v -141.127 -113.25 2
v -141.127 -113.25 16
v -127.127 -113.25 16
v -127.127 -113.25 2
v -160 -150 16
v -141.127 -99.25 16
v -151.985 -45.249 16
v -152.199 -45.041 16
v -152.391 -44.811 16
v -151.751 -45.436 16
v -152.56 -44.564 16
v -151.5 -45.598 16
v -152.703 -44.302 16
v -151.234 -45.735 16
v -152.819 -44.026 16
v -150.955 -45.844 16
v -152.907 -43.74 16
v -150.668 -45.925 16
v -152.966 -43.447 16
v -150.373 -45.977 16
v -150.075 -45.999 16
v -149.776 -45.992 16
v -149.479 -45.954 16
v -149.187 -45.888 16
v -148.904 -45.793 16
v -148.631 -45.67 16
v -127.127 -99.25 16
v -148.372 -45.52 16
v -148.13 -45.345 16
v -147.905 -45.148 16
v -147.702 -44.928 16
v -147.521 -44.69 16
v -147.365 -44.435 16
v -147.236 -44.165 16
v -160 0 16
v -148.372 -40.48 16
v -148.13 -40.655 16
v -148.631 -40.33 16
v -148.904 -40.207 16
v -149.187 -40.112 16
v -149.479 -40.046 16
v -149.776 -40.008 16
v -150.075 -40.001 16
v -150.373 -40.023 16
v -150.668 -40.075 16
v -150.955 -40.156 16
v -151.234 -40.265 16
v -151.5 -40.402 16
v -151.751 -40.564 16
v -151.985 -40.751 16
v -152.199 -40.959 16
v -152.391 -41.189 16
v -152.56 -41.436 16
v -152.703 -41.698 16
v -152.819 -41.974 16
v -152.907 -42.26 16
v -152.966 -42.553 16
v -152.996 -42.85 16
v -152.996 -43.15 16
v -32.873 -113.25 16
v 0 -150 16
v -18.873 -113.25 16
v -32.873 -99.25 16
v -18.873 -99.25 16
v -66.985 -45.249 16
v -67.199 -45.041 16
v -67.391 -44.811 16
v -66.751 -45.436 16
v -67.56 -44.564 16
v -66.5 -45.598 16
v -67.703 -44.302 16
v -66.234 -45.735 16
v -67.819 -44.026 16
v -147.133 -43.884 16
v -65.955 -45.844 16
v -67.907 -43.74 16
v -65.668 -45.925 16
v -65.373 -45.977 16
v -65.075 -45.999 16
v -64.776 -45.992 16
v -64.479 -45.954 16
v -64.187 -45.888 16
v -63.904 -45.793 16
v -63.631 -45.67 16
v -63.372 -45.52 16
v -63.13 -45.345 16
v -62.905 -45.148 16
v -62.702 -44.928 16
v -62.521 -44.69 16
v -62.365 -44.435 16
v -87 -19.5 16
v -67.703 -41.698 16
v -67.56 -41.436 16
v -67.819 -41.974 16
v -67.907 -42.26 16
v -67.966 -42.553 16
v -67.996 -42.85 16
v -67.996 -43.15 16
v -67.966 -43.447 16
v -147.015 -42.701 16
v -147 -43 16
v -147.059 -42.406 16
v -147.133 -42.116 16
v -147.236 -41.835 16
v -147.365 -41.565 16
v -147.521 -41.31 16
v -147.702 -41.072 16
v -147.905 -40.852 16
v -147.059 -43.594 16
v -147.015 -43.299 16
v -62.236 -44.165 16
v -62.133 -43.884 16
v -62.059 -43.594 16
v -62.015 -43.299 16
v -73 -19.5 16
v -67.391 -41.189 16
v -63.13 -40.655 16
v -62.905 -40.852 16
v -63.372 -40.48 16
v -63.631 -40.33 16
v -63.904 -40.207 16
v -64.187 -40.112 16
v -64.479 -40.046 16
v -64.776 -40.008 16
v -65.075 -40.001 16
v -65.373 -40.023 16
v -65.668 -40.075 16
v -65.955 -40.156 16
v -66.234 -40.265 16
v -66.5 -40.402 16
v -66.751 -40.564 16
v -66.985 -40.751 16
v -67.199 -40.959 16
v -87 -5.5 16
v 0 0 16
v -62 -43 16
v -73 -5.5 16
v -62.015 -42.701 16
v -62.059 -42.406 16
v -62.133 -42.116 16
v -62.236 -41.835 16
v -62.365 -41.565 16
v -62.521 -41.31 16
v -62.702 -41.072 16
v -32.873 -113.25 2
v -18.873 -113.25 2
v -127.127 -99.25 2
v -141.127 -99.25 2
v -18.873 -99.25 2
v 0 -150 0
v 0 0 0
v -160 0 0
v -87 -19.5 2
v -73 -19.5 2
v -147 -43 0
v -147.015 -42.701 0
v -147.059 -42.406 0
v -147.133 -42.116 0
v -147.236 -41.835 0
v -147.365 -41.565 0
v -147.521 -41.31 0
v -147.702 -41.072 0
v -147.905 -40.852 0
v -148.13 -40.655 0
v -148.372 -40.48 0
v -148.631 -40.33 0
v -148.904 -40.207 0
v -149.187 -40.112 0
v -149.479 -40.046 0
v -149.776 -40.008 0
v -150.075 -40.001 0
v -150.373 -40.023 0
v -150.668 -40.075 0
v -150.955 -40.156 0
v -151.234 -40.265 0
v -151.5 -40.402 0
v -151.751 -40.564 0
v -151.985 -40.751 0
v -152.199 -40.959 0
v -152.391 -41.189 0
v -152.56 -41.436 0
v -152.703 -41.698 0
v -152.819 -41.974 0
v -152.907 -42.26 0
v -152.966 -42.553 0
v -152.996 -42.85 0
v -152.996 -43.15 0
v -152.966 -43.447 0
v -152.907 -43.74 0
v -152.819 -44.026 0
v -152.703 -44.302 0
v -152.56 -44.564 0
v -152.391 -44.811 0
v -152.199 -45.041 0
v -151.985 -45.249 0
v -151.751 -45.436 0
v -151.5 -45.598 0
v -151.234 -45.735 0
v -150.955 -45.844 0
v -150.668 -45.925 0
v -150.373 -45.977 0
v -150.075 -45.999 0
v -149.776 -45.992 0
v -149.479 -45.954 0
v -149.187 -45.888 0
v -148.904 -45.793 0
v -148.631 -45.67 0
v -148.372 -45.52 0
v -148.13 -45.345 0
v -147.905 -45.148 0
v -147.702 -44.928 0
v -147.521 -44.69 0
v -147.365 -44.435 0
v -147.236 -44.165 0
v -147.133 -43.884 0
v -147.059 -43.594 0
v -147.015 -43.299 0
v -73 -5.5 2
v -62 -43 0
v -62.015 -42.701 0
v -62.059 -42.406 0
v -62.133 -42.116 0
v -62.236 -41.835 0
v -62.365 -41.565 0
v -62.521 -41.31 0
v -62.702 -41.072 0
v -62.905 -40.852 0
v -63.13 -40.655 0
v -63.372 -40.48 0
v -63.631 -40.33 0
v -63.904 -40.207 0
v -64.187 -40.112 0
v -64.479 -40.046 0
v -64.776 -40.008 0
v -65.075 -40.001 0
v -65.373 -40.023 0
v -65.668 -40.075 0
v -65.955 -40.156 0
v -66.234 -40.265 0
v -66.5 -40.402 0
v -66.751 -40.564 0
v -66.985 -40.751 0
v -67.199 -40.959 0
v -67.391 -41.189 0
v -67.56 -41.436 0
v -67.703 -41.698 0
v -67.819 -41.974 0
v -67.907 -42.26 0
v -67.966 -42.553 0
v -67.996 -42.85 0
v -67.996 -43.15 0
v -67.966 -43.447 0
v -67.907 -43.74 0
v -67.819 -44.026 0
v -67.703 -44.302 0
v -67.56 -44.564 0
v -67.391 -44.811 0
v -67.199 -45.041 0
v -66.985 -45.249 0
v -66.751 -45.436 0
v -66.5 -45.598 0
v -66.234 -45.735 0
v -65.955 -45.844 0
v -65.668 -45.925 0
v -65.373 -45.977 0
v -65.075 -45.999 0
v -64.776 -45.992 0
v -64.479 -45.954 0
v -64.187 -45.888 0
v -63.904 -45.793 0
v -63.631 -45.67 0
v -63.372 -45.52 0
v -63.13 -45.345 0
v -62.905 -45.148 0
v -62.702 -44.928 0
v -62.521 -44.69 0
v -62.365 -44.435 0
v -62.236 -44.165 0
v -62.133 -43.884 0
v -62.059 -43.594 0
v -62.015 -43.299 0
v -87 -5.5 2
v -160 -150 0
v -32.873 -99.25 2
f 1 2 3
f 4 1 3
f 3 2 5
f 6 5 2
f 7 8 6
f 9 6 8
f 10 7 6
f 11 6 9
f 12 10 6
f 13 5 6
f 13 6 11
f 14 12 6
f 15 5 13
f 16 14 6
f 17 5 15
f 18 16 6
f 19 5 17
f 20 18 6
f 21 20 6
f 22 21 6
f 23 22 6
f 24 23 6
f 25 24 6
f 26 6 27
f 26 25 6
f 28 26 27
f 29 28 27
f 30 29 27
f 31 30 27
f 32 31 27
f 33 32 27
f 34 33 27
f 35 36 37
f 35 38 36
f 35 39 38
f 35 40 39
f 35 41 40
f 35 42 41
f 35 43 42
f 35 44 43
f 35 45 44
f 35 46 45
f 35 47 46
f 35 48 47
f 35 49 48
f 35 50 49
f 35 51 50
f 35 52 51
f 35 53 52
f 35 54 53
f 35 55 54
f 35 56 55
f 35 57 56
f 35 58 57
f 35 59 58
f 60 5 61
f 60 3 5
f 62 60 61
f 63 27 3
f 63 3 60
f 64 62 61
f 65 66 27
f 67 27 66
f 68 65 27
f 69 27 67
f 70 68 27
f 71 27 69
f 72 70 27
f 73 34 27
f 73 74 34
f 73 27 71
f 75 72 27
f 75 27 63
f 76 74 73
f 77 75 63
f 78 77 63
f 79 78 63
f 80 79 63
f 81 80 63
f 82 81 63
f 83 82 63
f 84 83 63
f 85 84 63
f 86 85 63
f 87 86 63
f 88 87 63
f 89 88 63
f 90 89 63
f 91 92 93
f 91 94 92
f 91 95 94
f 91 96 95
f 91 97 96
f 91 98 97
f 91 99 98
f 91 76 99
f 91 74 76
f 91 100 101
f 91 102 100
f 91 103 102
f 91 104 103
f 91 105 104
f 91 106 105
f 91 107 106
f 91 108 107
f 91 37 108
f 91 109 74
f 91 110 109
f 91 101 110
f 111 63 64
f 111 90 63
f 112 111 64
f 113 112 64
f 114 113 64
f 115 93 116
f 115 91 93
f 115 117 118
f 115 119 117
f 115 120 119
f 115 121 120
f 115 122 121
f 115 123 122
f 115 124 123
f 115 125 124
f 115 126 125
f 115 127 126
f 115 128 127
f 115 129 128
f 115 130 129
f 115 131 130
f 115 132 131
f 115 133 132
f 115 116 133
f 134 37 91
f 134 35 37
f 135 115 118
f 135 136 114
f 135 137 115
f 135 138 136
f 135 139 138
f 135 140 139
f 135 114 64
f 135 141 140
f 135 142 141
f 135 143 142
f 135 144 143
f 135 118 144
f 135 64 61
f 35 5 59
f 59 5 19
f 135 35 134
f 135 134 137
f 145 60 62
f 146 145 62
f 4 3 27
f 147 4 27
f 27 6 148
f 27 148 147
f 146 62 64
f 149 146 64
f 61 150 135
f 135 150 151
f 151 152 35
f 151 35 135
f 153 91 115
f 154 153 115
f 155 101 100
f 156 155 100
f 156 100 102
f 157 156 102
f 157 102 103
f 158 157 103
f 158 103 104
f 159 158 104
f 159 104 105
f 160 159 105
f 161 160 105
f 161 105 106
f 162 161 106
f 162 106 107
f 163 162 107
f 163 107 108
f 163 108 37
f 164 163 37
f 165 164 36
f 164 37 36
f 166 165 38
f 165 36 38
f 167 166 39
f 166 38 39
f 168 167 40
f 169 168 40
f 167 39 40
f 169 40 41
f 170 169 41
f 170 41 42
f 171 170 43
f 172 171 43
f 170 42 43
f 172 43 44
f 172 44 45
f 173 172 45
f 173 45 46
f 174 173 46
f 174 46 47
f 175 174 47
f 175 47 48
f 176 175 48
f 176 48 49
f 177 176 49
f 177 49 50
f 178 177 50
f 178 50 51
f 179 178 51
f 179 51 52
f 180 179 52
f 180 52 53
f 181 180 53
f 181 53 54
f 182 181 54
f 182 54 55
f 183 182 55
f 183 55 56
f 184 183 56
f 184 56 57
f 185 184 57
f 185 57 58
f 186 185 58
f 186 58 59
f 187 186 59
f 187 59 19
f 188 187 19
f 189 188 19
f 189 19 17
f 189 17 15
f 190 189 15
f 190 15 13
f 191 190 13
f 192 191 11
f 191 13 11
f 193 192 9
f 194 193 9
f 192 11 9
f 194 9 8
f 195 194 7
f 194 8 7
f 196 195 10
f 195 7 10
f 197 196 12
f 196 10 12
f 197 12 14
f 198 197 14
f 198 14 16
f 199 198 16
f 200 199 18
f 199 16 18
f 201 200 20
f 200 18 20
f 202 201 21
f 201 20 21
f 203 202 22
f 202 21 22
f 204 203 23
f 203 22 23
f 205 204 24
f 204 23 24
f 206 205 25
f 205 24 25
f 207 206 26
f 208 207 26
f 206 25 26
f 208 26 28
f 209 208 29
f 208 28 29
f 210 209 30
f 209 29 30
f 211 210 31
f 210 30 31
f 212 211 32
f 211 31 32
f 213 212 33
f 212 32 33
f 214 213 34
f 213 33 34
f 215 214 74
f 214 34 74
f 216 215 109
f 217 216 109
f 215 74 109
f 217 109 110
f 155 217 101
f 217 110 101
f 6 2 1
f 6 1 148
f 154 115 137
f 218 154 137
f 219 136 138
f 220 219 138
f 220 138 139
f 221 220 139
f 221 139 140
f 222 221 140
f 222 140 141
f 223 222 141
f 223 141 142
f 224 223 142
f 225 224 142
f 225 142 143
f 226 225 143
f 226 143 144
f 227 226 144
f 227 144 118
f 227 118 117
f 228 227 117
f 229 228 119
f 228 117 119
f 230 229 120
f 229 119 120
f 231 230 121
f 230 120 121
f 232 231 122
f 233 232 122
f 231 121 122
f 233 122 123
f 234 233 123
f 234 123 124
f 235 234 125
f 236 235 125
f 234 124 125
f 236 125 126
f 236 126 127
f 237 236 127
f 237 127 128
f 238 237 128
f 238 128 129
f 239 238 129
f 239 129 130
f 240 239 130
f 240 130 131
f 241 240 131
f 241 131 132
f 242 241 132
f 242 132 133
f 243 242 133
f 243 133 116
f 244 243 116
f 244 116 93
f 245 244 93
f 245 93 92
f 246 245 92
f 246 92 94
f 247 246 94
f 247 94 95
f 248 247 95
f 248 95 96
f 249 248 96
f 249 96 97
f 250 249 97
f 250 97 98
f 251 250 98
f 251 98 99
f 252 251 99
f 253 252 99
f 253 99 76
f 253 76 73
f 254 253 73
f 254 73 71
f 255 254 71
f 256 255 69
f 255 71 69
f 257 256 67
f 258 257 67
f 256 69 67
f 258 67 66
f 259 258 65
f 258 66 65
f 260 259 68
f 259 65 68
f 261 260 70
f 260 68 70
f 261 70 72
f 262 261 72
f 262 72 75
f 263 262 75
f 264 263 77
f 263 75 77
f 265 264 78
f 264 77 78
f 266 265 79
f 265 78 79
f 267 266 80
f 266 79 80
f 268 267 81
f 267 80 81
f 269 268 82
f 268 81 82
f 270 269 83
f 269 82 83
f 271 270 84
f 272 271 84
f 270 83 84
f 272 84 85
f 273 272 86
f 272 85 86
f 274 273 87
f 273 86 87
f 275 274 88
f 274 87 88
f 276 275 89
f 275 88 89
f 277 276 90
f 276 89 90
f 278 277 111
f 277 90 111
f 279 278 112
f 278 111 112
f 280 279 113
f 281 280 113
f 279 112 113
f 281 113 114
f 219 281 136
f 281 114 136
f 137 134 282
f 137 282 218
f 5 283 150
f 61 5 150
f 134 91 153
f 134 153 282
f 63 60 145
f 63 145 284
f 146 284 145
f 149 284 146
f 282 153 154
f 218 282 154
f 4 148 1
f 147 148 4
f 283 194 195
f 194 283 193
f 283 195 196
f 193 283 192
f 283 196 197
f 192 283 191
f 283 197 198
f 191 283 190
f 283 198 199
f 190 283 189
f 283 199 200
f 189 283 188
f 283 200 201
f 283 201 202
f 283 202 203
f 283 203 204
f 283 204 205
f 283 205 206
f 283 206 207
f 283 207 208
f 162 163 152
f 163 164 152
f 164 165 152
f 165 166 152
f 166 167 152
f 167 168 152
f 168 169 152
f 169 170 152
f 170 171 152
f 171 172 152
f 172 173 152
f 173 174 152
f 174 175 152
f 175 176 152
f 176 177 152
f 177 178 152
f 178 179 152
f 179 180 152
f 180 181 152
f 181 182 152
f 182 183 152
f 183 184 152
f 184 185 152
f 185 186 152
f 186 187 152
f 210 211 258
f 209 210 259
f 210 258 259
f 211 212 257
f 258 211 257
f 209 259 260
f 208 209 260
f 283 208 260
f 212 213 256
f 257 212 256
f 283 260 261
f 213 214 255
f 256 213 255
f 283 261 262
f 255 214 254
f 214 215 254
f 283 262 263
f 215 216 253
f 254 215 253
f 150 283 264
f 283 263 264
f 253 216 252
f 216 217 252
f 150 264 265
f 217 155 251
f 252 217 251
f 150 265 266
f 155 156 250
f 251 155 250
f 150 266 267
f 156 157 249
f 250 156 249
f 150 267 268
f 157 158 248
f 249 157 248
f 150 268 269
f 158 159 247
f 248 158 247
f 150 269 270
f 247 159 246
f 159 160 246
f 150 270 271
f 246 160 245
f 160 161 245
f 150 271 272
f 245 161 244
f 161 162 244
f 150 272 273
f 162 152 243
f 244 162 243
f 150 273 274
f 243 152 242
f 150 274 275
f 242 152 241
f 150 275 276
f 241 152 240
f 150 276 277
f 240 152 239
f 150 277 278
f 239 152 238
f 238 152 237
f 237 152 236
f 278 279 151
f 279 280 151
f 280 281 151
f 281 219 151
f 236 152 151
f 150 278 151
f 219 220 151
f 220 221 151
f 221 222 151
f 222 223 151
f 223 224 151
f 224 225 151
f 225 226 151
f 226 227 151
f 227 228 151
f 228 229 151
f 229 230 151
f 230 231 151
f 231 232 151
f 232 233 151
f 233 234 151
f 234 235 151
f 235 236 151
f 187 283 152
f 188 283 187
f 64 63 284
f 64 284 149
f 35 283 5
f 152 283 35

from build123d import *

# Parameters (mm, degrees)
SKETCH1_W           = 160
SKETCH1_H           = 150
BOSS_EXTRUDE1_DEPTH = 16
SKETCH2_W           = 14
SKETCH2_H           = 14
CUT_EXTRUDE1_DEPTH  = 14
SKETCH3_R           = 3
CUT_EXTRUDE2_DEPTH  = 220.899977262


with BuildPart() as part:
    # Sketch1 → Boss-Extrude1 (new body)
    with BuildSketch(Plane.XY):
        with Locations((-80, -75)):
            Rectangle(SKETCH1_W, SKETCH1_H)
    extrude(amount=BOSS_EXTRUDE1_DEPTH)

    # Sketch2 → Cut-Extrude1 (cut)
    with BuildSketch(Plane.XY.offset(16)):
        with Locations((-80, -12.5)):
            Rectangle(SKETCH2_W, SKETCH2_H)
        with Locations((-134.126587737, -106.25)):
            Rectangle(SKETCH2_W, SKETCH2_H)
        with Locations((-25.873412263, -106.25)):
            Rectangle(SKETCH2_W, SKETCH2_H)
    extrude(amount=-CUT_EXTRUDE1_DEPTH, mode=Mode.SUBTRACT)

    # Sketch3 → Cut-Extrude2 (cut, through all)
    with BuildSketch(Plane.XY.offset(16)):
        with Locations((-65, -43)):
            Circle(SKETCH3_R)
        with Locations((-150, -43)):
            Circle(SKETCH3_R)
    extrude(amount=-CUT_EXTRUDE2_DEPTH, mode=Mode.SUBTRACT)


solid = part.part
